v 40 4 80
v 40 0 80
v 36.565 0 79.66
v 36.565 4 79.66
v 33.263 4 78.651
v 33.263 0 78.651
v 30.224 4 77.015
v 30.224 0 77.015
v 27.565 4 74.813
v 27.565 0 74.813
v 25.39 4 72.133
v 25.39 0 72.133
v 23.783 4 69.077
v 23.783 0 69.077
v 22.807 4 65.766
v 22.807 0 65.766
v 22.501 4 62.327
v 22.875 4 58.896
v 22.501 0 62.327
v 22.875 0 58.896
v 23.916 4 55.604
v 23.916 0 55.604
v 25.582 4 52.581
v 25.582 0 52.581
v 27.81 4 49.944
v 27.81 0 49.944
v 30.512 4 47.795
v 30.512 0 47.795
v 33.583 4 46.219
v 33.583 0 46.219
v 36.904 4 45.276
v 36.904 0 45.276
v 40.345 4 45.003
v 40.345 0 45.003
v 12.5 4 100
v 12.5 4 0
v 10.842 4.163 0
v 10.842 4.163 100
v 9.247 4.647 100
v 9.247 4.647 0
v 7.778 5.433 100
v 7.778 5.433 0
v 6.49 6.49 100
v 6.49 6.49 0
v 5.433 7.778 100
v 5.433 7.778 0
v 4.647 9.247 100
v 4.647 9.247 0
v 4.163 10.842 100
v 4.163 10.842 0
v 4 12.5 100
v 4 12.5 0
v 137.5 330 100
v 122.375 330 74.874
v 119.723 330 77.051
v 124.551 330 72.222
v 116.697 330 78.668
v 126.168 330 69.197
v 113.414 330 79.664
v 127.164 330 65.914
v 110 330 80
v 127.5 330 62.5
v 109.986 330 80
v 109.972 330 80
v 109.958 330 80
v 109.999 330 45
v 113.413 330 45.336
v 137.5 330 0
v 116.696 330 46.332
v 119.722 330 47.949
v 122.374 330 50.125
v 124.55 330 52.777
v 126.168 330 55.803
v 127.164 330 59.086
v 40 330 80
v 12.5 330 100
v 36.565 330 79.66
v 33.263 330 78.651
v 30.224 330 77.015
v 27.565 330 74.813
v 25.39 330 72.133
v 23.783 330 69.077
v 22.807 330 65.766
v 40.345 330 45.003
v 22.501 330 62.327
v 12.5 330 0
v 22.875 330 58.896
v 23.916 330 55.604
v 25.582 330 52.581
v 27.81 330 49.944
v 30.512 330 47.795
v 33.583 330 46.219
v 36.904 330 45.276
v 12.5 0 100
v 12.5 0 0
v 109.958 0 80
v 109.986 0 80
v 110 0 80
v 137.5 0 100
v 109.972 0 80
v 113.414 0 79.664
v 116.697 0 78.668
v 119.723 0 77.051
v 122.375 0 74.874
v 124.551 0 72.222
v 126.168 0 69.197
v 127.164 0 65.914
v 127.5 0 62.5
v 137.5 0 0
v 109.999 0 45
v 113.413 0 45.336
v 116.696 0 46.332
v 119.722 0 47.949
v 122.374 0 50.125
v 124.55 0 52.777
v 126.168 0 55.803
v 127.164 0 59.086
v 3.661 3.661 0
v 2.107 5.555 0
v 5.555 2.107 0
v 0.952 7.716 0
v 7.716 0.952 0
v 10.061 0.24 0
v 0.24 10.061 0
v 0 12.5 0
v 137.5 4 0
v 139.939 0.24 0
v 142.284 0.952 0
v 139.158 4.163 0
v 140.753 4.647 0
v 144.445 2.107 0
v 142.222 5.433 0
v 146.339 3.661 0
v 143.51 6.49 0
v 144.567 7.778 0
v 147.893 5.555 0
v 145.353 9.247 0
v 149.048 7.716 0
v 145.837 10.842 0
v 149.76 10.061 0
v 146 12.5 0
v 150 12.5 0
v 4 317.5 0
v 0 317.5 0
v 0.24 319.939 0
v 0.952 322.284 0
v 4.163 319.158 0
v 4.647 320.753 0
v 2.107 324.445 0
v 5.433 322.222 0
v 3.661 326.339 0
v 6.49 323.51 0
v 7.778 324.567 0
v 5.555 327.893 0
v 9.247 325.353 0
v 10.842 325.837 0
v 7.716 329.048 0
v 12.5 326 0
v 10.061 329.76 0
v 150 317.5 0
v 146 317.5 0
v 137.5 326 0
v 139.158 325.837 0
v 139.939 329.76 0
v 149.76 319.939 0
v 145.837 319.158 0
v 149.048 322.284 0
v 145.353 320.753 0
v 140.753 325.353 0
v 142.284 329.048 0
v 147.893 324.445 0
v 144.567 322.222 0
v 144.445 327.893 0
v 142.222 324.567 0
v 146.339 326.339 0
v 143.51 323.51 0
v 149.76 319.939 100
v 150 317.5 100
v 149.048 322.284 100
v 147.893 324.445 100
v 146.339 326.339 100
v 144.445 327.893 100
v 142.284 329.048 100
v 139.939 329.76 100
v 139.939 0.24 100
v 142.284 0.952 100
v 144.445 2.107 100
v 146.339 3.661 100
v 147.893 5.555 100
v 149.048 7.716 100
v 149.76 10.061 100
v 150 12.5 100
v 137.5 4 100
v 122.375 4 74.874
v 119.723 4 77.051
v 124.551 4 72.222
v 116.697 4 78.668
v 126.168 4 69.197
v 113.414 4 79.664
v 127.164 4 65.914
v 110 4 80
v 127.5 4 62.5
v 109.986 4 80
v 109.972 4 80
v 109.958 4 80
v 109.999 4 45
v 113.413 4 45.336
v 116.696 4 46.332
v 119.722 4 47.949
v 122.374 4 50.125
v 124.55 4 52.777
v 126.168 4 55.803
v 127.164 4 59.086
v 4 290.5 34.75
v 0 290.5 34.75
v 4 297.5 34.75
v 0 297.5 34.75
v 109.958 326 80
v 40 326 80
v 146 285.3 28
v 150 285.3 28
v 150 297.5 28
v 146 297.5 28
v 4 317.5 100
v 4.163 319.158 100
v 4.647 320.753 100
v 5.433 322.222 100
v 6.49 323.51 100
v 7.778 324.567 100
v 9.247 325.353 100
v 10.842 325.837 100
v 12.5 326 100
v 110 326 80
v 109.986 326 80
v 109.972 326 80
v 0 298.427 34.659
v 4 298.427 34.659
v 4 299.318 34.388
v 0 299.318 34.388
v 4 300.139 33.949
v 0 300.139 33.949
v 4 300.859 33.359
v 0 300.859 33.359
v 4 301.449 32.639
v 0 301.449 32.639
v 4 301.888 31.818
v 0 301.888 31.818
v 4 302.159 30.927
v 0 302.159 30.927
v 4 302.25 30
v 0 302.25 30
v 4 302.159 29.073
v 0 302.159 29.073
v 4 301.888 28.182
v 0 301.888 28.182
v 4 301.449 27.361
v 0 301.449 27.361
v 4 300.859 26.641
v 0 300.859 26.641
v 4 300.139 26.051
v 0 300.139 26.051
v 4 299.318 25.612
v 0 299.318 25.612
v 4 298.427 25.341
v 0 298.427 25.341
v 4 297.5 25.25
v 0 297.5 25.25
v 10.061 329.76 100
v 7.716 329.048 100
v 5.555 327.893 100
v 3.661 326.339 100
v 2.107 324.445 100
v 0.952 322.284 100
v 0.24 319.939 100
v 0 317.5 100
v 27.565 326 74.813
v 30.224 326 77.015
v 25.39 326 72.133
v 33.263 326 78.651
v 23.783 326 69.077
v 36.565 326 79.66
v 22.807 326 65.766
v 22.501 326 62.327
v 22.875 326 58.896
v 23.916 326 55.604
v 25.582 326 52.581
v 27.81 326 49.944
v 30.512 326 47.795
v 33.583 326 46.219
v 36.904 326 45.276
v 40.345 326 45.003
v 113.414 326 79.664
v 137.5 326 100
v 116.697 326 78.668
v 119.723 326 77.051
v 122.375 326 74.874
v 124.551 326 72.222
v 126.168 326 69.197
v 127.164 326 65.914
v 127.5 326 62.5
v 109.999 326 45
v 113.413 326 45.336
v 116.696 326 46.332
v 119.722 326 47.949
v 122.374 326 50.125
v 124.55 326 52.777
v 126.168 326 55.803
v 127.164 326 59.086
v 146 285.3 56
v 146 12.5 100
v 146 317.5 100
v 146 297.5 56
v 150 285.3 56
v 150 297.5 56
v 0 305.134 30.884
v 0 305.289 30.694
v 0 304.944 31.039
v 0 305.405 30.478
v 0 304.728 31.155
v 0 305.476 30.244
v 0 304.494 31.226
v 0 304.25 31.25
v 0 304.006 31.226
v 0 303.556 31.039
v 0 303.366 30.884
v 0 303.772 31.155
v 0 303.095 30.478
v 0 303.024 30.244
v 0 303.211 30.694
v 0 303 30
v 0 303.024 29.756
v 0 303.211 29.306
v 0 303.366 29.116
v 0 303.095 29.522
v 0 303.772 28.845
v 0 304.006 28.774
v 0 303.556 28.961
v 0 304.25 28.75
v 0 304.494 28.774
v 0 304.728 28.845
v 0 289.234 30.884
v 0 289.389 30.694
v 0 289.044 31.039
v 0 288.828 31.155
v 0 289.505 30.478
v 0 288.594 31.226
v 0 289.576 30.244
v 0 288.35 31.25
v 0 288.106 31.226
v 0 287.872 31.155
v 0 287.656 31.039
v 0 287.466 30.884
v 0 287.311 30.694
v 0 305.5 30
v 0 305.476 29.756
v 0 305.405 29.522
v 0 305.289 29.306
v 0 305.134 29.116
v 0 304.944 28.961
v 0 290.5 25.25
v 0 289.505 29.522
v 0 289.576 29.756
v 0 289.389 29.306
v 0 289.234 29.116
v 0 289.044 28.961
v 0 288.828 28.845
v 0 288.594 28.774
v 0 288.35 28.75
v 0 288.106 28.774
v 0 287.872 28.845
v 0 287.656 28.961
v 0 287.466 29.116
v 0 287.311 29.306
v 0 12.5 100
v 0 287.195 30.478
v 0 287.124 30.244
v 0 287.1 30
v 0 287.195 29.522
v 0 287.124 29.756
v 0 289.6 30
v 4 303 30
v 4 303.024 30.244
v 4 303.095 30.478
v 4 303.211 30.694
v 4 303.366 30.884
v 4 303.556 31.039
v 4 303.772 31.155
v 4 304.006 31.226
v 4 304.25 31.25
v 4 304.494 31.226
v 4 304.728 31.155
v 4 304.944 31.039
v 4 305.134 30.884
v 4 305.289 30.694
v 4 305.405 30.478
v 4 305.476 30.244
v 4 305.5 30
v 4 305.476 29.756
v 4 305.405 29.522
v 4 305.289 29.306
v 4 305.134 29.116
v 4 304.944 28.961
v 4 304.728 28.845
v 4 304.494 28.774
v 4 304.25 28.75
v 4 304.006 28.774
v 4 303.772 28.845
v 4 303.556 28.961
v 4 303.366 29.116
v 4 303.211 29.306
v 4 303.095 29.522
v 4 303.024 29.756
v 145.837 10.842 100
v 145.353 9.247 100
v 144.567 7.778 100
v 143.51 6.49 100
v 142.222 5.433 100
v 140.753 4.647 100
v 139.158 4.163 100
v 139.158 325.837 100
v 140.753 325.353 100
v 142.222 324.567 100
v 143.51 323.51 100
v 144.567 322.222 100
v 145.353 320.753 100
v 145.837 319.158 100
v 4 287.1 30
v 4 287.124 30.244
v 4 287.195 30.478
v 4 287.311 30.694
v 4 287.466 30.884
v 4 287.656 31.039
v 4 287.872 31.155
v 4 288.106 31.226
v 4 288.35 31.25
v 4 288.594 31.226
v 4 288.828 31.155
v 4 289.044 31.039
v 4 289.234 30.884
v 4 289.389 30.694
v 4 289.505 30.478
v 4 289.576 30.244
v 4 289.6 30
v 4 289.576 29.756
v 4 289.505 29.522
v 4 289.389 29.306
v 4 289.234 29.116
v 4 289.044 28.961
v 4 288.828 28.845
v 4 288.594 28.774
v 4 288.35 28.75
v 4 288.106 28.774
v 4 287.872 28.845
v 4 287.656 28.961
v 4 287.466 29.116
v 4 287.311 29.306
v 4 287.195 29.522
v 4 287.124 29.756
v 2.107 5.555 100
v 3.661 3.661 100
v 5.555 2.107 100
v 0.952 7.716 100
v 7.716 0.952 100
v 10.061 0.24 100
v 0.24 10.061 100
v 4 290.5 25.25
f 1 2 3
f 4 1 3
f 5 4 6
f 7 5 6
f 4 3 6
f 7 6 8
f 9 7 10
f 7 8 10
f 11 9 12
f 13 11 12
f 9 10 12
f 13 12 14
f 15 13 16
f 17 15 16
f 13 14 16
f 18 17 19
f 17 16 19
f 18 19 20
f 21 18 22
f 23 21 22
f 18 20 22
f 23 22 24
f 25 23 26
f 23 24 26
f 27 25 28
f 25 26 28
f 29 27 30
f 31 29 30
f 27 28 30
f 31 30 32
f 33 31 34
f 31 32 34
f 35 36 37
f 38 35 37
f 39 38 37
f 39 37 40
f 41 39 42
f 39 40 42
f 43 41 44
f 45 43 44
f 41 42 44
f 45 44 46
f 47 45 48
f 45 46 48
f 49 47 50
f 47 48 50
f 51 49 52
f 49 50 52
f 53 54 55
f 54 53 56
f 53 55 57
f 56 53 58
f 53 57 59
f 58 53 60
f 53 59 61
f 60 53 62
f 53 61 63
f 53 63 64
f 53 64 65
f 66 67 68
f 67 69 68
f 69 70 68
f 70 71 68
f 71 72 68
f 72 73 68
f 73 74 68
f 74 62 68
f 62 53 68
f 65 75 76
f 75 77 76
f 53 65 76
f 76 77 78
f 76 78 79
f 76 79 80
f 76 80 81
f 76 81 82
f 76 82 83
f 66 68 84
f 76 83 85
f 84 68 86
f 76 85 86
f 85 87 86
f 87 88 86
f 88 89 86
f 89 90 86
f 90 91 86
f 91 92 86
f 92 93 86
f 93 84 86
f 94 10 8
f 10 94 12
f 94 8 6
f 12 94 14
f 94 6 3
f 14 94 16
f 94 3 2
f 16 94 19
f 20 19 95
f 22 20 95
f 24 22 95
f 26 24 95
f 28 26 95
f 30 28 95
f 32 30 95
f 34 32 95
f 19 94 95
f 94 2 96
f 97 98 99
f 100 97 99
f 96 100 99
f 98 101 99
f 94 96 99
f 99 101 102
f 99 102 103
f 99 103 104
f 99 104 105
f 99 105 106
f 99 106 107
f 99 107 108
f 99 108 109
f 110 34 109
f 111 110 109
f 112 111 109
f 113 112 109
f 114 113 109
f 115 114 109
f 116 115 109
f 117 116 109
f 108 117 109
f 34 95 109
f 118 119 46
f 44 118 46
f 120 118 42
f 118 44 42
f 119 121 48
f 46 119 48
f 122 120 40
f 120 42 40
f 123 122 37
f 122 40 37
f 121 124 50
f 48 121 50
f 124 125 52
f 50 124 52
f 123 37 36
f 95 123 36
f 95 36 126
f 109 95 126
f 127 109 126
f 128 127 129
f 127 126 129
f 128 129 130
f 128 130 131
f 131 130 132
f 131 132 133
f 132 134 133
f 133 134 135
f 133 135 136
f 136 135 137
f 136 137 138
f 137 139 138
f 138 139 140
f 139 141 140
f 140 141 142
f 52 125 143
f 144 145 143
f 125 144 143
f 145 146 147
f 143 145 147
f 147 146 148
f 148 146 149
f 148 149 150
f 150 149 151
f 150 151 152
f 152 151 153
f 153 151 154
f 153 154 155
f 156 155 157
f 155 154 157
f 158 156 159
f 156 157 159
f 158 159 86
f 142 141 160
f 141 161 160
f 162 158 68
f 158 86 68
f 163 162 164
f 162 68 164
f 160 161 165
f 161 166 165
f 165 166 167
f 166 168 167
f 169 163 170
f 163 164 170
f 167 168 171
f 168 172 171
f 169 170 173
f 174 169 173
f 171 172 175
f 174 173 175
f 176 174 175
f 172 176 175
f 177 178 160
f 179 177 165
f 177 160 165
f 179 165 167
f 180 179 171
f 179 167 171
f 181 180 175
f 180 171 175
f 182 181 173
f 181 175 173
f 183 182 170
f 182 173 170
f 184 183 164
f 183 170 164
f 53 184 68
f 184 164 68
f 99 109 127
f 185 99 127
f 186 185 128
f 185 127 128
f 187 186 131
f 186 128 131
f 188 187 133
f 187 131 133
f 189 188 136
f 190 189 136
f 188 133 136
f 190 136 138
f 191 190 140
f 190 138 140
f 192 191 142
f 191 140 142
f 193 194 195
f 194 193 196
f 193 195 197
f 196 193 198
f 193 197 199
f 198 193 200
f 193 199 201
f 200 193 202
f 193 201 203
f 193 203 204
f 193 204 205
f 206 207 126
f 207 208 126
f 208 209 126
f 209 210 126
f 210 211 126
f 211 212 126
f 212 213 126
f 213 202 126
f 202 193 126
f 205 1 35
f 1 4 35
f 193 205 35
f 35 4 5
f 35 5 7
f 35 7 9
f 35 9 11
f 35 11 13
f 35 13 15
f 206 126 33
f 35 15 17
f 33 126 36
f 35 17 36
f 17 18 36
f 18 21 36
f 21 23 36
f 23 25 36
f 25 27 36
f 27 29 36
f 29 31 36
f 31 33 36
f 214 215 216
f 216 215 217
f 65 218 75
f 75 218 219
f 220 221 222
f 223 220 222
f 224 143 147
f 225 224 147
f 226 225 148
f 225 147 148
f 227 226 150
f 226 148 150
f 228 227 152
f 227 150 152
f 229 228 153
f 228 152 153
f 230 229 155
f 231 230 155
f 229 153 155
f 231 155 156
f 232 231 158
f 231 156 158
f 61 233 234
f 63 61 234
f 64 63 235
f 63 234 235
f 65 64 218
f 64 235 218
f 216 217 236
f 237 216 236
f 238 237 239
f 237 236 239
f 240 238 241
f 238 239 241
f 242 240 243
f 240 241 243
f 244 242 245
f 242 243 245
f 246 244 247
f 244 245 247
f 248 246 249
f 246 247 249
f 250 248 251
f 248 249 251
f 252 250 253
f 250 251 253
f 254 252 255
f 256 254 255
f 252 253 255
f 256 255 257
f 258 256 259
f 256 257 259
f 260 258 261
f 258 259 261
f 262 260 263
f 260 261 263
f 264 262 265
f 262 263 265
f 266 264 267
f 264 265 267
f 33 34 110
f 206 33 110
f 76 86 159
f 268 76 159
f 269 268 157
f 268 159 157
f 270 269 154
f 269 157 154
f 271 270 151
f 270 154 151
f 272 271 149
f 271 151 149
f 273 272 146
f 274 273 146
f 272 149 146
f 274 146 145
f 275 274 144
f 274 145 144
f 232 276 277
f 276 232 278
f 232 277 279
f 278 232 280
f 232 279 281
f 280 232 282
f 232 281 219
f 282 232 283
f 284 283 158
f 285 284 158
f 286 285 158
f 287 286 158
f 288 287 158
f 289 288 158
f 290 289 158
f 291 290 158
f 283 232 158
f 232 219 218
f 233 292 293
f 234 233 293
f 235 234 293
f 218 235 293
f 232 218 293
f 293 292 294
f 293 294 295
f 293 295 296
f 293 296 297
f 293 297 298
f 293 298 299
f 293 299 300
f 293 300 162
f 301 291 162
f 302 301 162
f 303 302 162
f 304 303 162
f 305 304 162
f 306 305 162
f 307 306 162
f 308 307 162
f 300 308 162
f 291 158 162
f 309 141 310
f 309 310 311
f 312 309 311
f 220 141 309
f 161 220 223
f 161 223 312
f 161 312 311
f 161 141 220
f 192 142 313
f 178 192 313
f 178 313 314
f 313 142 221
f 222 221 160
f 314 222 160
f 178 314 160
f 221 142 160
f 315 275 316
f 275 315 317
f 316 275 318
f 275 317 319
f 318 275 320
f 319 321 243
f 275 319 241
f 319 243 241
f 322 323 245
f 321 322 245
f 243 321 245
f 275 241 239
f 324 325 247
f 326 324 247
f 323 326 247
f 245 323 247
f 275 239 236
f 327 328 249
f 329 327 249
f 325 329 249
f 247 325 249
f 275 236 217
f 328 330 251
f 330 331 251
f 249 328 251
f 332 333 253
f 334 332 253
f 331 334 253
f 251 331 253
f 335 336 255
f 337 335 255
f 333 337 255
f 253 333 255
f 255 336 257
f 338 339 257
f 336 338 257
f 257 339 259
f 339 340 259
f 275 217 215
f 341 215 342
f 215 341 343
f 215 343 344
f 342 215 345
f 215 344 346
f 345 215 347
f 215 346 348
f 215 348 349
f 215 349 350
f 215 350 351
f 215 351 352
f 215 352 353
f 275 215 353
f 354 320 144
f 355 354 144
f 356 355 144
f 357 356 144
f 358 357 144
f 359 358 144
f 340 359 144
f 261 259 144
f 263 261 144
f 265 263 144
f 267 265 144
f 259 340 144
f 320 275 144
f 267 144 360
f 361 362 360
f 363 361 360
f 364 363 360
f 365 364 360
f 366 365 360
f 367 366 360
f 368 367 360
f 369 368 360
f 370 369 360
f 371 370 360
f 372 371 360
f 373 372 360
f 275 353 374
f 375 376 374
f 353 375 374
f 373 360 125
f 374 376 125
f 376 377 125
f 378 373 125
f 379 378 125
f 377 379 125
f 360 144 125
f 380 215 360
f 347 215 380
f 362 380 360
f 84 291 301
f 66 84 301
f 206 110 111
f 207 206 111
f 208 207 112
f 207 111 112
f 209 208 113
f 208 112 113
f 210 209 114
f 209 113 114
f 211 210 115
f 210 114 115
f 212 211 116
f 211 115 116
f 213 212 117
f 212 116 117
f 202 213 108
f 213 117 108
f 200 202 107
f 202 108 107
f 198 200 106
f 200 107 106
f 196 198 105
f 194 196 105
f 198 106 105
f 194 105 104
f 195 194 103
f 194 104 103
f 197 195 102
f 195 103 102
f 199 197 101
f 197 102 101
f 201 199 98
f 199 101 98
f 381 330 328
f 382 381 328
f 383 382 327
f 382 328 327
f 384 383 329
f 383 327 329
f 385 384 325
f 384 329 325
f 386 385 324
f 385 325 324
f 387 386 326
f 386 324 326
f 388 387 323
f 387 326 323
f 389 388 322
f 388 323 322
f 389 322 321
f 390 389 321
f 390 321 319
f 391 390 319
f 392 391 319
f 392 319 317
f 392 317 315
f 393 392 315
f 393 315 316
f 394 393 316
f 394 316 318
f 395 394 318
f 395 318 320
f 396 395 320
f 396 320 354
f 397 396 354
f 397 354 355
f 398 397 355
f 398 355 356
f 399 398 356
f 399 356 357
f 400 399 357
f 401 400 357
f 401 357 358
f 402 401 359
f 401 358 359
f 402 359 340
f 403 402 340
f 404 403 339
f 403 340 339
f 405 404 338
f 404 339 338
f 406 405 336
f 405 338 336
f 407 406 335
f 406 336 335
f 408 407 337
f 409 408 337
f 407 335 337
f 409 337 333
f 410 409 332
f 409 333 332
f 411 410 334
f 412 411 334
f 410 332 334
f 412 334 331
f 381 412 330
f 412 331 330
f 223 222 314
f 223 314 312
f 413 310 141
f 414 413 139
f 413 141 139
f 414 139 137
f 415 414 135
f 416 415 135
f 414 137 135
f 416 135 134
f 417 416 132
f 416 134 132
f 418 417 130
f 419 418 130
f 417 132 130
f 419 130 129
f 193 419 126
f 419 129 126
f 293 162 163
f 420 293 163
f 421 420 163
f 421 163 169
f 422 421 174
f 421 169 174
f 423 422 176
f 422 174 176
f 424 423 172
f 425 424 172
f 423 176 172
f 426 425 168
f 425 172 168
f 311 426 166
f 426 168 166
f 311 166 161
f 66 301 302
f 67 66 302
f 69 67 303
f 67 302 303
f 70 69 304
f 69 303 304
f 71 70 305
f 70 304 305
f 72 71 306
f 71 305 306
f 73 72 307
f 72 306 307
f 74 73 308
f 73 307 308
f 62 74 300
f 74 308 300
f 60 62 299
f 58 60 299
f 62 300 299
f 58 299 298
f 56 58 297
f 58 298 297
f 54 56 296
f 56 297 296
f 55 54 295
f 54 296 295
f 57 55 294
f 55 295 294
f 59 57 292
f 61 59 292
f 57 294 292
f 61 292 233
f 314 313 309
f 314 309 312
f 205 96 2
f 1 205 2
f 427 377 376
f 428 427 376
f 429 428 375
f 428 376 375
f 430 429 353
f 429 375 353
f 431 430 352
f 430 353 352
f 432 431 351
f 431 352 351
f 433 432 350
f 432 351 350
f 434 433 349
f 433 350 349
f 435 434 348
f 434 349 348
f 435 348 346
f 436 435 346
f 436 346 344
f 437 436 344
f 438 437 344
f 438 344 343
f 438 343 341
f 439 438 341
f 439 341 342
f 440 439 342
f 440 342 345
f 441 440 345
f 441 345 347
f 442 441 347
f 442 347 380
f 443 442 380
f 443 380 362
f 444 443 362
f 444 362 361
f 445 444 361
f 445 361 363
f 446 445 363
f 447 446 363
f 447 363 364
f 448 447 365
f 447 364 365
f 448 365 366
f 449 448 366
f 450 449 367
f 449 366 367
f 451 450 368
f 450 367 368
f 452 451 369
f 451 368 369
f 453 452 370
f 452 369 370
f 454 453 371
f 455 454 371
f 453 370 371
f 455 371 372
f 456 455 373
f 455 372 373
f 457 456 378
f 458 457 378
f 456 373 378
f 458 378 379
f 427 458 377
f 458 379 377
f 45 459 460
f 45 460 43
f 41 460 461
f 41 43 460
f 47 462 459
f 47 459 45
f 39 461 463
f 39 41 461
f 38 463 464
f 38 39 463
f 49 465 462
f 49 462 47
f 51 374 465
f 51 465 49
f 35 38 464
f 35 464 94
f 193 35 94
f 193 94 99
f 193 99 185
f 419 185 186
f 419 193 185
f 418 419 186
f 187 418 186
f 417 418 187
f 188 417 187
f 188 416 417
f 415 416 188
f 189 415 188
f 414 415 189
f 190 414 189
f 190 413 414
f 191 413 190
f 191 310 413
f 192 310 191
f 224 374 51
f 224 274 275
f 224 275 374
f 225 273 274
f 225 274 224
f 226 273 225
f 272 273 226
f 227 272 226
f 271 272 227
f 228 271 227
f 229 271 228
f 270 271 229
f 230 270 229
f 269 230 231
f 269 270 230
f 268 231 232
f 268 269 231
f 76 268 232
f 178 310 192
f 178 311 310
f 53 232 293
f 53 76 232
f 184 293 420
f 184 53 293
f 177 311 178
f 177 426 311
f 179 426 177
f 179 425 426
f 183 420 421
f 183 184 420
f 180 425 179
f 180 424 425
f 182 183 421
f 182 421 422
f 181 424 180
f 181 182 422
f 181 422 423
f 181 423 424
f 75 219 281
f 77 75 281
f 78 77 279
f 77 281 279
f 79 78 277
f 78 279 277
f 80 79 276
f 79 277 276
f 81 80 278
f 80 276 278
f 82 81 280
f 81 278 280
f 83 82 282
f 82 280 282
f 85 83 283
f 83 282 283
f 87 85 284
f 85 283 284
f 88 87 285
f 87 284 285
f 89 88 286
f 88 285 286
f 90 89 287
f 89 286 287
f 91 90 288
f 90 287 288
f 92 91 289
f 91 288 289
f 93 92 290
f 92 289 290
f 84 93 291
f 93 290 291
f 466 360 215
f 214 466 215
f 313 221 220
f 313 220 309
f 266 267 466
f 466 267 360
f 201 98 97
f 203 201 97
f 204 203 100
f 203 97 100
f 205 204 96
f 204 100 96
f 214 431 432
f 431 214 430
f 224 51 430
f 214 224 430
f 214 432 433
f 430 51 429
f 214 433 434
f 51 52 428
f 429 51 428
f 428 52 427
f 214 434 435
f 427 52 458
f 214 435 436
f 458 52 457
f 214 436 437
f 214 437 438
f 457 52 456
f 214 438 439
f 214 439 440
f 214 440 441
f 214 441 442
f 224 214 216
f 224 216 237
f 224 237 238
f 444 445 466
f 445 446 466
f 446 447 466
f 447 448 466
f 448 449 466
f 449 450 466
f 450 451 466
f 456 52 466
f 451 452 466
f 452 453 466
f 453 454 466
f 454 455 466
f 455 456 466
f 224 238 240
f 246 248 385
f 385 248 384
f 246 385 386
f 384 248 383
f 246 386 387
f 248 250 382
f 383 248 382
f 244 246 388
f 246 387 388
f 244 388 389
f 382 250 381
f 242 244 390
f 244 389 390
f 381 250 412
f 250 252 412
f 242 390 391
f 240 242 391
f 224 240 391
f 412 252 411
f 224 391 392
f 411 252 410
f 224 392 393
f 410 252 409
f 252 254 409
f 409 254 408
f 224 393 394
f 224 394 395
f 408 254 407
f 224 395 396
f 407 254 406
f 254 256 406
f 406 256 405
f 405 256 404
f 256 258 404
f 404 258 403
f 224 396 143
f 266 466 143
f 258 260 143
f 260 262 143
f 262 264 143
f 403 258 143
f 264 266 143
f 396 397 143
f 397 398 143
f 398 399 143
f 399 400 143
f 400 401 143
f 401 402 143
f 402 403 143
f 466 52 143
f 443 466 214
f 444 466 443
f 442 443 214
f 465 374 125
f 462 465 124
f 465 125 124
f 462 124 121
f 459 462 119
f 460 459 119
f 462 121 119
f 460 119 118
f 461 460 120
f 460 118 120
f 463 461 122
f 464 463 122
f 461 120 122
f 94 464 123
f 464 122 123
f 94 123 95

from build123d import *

# Parameters (mm, degrees)
F1_DEPTH  = 100
F3_DEPTH  = 330.001
F4_W      = 12.2
F4_H      = 28
F5_DEPTH  = 25
F6_DEPTH  = 6
F7_DEPTH  = 6
F9_DEPTH  = 4
F8_R      = 1.25
F10_DEPTH = 25


with BuildPart() as f1:
    # F0 (on Top) → F1 (new body)
    with BuildSketch(Plane.XY):
        with BuildLine():
            ThreePointArc((0, 12.5), (3.6611652352, 3.6611652352), (12.5, 0))
            Line((12.5, 0), (137.5, 0))
            ThreePointArc((137.5, 0), (146.3388347648, 3.6611652352), (150, 12.5))
            Line((150, 12.5), (150, 317.5))
            ThreePointArc((150, 317.5), (146.3388347648, 326.3388347648), (137.5, 330))
            Line((137.5, 330), (12.5, 330))
            ThreePointArc((12.5, 330), (3.6611652352, 326.3388347648), (0, 317.5))
            Line((0, 317.5), (0, 12.5))
        make_face()
        with BuildLine():
            ThreePointArc((12.5, 4), (6.4895923599, 6.4895923599), (4, 12.5))
            Line((4, 12.5), (4, 317.5))
            ThreePointArc((4, 317.5), (6.4895923599, 323.5104076401), (12.5, 326))
            Line((12.5, 326), (137.5, 326))
            ThreePointArc((137.5, 326), (143.5104076401, 323.5104076401), (146, 317.5))
            Line((146, 317.5), (146, 12.5))
            ThreePointArc((146, 12.5), (143.5104076401, 6.4895923599), (137.5, 4))
            Line((137.5, 4), (12.5, 4))
        make_face(mode=Mode.SUBTRACT)
    extrude(amount=F1_DEPTH)

    # F2 (on face) → F3 (cut, through all)
    with BuildSketch(Plane.XZ):
        with BuildLine():
            Line((109.958435546, 80), (40, 80))
            ThreePointArc((40, 80), (22.5008510571, 62.3274129951), (40.3451572234, 45.0034041456))
            Line((40.3451572234, 45.0034041456), (109.9991571426, 45.0000493805))
            ThreePointArc((109.9991571426, 45.0000493805), (127.4999999949, 62.4996279315), (110, 80.0000493602))
            ThreePointArc((110, 80.0000493602), (109.9792177583, 80.0000370201), (109.958435546, 80))
        make_face()
    extrude(amount=-F3_DEPTH, mode=Mode.SUBTRACT)

    # F4 (on face) → F5 (cut)
    with BuildSketch(Plane.YZ.offset(150)):
        with Locations((291.4, 36)):
            Rectangle(F4_W, F4_H)
    extrude(amount=-F5_DEPTH, mode=Mode.SUBTRACT)

    # F6 (add): a face of the model
    f6_faces = [f1.faces().sort_by_distance(p)[0] for p in [
        (148, 291.4, 22),
    ]]
    extrude(f6_faces, amount=F6_DEPTH)

    # F7 (cut): a face of the model
    f7_faces = [f1.faces().sort_by_distance(p)[0] for p in [
        (148, 291.4, 50),
    ]]
    extrude(f7_faces, amount=-F7_DEPTH, mode=Mode.SUBTRACT)

    # F8 (on face) → F9 (cut, through all)
    with BuildSketch(Plane(origin=(0, 0, 0), x_dir=(0, -1, 0), z_dir=(-1, 0, 0))):
        with BuildLine():
            Line((-290.5, 34.75), (-297.5, 34.75))
            ThreePointArc((-297.5, 34.75), (-302.25, 30), (-297.5, 25.25))
            Line((-297.5, 25.25), (-290.5, 25.25))
            Line((-290.5, 25.25), (-290.5, 34.75))
        make_face()
    extrude(amount=-F9_DEPTH, mode=Mode.SUBTRACT)

    # F8 (on face) → F10 (cut)
    with BuildSketch(Plane(origin=(0, 0, 0), x_dir=(0, -1, 0), z_dir=(-1, 0, 0))):
        with BuildLine():
            Line((-290.5, 34.75), (-297.5, 34.75))
            ThreePointArc((-297.5, 34.75), (-302.25, 30), (-297.5, 25.25))
            Line((-297.5, 25.25), (-290.5, 25.25))
            Line((-290.5, 25.25), (-290.5, 34.75))
        make_face()
        with Locations((-304.25, 30)):
            Circle(F8_R)
        with Locations((-288.35, 30)):
            Circle(F8_R)
    extrude(amount=-F10_DEPTH, mode=Mode.SUBTRACT)


solid = f1.part
